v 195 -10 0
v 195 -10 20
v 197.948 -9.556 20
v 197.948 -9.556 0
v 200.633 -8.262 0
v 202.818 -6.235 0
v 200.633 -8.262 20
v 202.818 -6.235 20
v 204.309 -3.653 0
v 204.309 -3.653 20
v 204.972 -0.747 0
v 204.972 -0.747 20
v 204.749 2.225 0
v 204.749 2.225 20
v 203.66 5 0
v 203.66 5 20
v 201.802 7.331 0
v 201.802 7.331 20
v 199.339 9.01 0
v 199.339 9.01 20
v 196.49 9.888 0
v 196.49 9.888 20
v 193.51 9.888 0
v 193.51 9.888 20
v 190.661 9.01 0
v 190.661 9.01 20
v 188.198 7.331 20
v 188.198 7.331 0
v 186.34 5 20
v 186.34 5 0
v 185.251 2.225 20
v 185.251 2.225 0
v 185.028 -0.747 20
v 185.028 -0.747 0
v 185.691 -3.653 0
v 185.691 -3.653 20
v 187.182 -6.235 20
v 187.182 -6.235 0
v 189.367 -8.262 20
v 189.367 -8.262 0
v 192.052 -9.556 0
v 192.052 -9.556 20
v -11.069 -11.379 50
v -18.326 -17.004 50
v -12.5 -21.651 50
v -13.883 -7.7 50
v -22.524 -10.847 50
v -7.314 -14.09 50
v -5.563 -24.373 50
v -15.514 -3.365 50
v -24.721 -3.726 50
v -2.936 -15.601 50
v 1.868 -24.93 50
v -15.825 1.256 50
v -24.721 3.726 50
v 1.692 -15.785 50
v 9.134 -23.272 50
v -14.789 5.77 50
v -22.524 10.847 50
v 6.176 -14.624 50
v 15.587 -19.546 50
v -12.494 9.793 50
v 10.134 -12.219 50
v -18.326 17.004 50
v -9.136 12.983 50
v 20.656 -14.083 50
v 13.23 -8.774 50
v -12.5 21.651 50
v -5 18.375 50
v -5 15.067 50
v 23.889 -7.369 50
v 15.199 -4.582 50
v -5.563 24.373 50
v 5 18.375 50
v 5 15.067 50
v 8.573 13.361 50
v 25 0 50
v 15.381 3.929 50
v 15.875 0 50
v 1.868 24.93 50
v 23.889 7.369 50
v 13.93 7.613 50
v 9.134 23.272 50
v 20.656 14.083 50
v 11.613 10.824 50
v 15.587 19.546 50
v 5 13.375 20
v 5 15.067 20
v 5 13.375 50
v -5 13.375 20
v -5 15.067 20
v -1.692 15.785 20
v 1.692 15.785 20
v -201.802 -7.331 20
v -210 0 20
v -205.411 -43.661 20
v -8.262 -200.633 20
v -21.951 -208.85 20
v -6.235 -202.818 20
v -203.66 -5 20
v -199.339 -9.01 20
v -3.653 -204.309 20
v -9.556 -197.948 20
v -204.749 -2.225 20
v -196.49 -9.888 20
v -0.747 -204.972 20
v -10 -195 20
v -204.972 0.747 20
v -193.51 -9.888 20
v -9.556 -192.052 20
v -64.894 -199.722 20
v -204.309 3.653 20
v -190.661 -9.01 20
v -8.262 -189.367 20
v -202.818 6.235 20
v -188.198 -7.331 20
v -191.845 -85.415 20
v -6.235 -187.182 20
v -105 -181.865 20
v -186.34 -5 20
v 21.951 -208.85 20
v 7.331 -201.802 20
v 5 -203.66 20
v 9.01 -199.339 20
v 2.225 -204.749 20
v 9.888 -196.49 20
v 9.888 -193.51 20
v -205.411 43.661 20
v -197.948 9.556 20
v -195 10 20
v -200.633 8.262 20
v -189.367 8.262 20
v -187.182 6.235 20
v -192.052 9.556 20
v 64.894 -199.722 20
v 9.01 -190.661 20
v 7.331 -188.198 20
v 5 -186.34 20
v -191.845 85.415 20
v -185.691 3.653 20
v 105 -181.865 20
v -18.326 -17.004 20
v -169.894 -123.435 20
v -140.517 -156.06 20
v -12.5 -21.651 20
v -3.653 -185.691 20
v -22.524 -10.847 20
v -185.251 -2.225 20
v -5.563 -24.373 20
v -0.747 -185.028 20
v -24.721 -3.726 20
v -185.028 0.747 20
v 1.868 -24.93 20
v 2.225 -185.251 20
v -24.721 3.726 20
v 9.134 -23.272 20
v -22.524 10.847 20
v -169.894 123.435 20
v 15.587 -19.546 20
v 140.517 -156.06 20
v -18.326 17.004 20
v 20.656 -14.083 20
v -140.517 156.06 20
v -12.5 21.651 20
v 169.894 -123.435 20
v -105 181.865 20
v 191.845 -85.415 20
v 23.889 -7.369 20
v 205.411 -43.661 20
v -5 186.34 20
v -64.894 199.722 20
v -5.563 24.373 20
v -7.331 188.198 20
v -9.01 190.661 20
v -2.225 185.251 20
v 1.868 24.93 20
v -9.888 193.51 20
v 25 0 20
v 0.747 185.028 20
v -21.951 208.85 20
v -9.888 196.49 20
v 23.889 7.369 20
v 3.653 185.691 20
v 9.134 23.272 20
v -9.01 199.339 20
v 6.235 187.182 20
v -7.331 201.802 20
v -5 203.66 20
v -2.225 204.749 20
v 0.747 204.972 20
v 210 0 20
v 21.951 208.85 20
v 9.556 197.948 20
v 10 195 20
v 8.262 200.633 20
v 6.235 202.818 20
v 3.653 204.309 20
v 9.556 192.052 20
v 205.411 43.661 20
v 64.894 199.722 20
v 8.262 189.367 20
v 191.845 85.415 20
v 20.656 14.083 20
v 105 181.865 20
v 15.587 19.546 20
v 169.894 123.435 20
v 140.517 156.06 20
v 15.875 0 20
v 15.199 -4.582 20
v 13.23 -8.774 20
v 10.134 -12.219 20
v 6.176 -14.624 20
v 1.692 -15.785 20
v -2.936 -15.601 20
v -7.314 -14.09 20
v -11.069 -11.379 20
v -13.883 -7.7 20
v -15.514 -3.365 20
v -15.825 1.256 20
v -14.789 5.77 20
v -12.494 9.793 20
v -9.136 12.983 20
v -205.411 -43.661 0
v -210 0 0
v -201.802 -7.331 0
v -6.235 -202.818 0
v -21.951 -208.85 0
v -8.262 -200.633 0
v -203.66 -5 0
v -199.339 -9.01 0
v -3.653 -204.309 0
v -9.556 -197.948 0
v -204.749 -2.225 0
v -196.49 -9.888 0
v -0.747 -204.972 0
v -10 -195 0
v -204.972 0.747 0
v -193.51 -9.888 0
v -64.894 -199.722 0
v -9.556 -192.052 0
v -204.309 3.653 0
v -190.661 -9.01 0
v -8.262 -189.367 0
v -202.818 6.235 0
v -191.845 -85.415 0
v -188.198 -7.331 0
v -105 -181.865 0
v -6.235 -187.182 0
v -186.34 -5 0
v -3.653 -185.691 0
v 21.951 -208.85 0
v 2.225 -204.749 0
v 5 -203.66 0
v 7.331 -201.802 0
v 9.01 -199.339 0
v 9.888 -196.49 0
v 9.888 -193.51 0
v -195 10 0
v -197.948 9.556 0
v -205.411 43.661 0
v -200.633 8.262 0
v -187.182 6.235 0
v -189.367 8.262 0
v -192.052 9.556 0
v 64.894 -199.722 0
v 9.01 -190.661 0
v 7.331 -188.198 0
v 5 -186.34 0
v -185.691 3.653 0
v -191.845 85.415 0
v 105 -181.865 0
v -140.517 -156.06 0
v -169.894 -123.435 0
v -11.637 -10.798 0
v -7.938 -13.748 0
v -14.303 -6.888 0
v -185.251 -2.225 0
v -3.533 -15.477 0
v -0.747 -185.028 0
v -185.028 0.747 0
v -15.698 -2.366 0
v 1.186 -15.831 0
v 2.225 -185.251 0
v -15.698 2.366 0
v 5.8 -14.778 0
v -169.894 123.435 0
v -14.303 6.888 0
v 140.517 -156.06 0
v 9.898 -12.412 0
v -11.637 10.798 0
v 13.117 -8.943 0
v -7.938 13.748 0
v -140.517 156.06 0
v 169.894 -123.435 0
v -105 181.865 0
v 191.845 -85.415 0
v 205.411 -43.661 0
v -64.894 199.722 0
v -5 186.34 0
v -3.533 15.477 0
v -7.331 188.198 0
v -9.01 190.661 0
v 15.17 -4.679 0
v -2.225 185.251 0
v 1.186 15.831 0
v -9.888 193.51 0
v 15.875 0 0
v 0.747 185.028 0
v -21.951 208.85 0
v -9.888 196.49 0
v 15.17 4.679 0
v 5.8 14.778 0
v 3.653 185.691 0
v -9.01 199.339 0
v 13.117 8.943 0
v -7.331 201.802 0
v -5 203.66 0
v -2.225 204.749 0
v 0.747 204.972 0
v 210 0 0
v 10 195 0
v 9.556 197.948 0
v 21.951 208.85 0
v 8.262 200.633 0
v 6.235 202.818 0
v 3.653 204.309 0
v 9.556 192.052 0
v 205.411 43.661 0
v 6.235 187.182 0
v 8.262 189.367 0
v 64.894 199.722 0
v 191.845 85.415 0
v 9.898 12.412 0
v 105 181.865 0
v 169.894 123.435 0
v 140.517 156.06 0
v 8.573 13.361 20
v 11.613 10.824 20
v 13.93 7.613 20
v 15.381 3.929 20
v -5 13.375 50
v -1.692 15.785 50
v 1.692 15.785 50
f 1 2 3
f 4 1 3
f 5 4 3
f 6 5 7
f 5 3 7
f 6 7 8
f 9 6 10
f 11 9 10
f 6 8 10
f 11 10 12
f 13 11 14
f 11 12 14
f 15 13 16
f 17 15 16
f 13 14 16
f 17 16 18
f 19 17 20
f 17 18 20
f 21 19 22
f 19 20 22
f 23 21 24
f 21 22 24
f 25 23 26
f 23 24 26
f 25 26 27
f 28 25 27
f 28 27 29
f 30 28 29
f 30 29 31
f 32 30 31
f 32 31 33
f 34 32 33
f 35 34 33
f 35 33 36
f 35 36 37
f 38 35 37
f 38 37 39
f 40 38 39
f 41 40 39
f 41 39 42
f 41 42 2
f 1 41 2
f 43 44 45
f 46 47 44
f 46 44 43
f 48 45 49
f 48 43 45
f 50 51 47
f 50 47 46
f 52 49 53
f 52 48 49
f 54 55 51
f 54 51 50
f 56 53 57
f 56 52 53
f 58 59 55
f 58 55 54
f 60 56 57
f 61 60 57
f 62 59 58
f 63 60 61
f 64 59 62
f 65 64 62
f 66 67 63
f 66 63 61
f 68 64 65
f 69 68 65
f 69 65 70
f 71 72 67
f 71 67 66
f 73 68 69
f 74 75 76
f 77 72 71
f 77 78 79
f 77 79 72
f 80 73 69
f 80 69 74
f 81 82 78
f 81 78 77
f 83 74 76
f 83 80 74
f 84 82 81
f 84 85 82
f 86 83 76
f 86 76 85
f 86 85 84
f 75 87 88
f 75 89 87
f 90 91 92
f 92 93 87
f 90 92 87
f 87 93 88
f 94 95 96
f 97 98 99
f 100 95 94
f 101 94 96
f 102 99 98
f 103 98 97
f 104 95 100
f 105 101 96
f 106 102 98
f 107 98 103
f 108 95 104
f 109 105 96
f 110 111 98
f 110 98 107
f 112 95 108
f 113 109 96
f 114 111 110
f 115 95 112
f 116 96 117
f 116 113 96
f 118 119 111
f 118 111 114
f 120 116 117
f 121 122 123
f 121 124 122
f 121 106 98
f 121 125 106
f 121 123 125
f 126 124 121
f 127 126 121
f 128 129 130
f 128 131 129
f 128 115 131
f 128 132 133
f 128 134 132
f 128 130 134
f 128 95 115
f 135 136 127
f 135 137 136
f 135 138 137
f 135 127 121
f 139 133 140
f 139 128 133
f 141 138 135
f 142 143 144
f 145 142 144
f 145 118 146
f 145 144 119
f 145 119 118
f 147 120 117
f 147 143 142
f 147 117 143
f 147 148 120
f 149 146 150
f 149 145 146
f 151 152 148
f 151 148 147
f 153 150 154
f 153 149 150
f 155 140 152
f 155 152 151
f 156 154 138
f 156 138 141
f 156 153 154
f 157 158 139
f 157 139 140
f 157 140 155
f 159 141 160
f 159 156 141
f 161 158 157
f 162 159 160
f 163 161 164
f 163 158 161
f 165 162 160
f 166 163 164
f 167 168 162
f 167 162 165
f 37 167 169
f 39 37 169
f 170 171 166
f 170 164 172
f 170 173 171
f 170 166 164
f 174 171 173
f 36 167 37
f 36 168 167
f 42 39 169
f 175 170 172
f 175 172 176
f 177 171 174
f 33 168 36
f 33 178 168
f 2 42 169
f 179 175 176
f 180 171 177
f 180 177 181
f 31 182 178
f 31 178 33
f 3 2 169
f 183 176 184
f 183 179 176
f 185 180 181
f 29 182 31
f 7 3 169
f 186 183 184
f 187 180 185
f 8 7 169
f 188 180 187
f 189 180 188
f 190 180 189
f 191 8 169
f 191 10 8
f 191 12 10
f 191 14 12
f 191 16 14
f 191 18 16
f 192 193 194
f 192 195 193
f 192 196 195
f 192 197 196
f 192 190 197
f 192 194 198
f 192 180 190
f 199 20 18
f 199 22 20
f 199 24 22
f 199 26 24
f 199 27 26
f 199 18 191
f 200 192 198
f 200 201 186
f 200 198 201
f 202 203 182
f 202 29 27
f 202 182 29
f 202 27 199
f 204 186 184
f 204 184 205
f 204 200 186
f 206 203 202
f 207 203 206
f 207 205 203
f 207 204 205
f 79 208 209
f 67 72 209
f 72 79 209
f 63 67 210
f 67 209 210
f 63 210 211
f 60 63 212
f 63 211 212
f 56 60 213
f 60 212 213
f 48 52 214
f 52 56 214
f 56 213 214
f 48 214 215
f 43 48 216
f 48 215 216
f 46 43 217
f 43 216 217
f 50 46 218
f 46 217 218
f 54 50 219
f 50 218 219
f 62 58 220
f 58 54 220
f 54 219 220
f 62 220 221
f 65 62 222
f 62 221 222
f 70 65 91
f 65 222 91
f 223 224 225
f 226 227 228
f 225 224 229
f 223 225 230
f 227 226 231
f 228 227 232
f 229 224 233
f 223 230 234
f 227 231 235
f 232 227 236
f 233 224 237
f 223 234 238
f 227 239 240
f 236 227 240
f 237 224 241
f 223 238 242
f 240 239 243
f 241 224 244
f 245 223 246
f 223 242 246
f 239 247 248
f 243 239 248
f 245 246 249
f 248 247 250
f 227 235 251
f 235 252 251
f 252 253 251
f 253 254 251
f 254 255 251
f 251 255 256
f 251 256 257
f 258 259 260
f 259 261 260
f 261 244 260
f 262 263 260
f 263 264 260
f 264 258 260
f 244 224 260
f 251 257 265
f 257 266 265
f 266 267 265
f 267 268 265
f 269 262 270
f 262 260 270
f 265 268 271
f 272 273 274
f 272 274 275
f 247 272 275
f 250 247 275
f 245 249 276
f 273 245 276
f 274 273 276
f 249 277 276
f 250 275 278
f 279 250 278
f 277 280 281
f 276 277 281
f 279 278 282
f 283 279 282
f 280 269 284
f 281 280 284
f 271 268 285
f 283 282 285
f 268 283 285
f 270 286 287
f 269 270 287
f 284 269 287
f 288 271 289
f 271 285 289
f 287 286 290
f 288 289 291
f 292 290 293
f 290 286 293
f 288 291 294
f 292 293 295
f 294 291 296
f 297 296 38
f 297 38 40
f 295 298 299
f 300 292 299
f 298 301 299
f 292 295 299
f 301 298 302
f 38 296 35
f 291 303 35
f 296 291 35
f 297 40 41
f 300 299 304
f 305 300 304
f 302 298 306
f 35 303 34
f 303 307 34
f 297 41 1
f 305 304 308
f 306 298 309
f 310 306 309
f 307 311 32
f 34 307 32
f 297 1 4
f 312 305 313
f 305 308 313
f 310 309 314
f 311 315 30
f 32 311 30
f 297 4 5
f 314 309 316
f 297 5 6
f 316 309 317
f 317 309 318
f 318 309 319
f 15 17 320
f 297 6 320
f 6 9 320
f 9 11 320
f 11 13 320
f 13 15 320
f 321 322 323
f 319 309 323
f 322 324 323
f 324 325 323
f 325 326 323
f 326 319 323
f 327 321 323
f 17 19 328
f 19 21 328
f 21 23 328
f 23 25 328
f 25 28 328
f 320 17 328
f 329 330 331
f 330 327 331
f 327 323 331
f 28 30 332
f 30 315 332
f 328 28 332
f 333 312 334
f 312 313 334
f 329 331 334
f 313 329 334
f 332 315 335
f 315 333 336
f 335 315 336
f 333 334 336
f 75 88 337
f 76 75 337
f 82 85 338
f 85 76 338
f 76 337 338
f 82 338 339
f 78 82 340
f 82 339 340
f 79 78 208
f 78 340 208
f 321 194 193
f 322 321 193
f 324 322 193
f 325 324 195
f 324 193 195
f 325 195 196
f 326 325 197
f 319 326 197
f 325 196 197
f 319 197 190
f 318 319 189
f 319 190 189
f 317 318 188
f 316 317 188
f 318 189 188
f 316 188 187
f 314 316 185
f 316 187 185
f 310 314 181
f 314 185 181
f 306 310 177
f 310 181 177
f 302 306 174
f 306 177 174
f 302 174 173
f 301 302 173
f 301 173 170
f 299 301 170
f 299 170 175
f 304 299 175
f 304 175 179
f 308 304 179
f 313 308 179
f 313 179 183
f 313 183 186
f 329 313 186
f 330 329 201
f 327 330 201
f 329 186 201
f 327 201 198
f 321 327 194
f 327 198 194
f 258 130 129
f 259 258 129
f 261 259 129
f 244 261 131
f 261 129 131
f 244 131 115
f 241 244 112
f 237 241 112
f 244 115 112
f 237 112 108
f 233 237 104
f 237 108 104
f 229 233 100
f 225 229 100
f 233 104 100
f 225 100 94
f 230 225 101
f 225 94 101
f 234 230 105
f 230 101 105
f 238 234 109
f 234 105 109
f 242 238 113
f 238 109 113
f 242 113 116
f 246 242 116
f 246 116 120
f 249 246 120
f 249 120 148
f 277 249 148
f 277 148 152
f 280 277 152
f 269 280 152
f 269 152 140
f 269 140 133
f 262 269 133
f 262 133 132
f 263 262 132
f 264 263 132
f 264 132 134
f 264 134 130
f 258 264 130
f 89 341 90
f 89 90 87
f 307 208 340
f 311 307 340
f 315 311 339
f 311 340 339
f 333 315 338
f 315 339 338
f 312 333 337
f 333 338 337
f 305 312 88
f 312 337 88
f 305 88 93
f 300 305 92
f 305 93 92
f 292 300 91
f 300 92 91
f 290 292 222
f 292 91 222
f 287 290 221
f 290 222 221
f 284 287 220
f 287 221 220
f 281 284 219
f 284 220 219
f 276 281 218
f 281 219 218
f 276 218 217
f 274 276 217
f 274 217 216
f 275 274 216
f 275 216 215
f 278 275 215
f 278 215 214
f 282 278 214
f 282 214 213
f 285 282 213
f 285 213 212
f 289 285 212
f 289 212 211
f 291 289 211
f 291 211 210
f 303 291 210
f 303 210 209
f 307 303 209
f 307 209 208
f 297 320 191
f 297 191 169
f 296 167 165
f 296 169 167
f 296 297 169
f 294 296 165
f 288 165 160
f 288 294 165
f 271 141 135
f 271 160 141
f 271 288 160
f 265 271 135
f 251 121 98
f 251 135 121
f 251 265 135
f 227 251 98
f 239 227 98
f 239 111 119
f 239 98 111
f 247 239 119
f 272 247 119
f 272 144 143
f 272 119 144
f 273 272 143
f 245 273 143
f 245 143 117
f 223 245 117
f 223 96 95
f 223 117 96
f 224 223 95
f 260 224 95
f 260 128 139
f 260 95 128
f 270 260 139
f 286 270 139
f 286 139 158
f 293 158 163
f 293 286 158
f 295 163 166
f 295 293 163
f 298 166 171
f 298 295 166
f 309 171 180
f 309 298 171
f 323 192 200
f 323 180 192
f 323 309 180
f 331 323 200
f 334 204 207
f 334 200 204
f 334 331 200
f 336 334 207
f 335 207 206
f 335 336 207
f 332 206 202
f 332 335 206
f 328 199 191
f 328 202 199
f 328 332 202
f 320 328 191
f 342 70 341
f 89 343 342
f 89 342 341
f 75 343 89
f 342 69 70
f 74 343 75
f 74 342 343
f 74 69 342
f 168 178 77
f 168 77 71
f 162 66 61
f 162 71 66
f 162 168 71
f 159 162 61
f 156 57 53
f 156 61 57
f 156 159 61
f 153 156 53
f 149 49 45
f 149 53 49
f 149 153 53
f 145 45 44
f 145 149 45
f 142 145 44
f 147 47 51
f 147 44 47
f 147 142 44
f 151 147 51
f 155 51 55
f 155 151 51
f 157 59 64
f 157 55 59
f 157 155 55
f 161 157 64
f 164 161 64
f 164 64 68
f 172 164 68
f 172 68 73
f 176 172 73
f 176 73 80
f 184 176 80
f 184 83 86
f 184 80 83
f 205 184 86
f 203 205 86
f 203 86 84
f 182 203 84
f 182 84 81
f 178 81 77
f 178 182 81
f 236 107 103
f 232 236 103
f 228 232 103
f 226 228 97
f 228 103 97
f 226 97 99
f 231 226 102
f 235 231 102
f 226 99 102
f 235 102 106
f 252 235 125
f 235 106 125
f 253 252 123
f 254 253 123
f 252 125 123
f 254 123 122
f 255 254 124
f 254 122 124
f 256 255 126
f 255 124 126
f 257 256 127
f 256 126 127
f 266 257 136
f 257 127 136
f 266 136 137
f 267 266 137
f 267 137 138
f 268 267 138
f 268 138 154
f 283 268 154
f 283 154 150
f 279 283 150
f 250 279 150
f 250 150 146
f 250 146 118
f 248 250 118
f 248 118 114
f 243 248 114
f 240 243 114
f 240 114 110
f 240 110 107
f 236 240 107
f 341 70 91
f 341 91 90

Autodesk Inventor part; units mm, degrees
ref_plane "YZ Plane" through (0, 0, 0) normal (1, 0, 0) x (0, 1, 0)
ref_plane "XZ Plane" through (0, 0, 0) normal (0, 1, 0) x (-1, 0, 0)
ref_plane "XY Plane" through (0, 0, 0) normal (0, 0, 1) x (1, 0, 0)
sketch "Sketch1" plane through (0, 0, 0) normal (0, 0, 1) x (1, 0, 0)
  point P0 (0, 0)
sketch "Sketch2" plane through (0, 0, 0) normal (0, 0, 1) x (1, 0, 0)
  circle A0 centre (0, 0) radius 210
  dimension "d0" = 420
extrude "Extrusion1" add sketch "Sketch2" along normal blind 20
sketch "Sketch3" plane through (0, 0, 20) normal (0, 0, 1) x (1, 0, 0)
  circle A0 centre (0, 0) radius 25
  circle A1 centre (0, 0) radius 15.875
  dimension "d6" = 50
  dimension "d7" = 31.75
extrude "Extrusion2" add sketch "Sketch3" along normal blind 30
extrude "Extrusion3" cut sketch "Sketch3" against normal blind 20 contours A1
sketch "Sketch4" plane through (0, 0, 20) normal (0, 0, 1) x (1, 0, 0)
  circle A0 centre (0, 0) radius 15.875 projected
  circle A1 centre (0, 0) radius 180
  circle A2 centre (0, 195) radius 10
  dimension "d12" = 360
  dimension "d13" = 20
  dimension "d23" = 195
extrude "Extrusion4" cut sketch "Sketch4" against normal blind 20 contours A2
sketch "Sketch5" plane through (0, 0, 50) normal (0, 0, 1) x (1, 0, 0)
  line L0 (-5, 13.375) -> (5, 13.375)
  line L1 (5, 13.375) -> (5, 18.375)
  line L2 (5, 18.375) -> (-5, 18.375)
  line L3 (-5, 18.375) -> (-5, 13.375)
  circle A0 centre (0, 0) radius 15.875 projected
  line L4 (-5, 13.375) -> (5, 18.375) construction
  line L5 (5, 13.375) -> (-5, 18.375) construction
  point P0 (0, 15.875)
  point P1 (-5, 15.067)
  point P2 (5, 15.067)
  dimension "d19" = 10
  dimension "d20" = 5
extrude "Extrusion5" add sketch "Sketch5" against normal blind 30 contours L3 A0 L1 L0 | L3 L2 L1 A0 picked at (-0.5641, 14.1782)
pattern_circular "Circular Pattern1" count 4 over 360 about axis through (0, 0, 0) along (0, 0, 1) of "Extrusion4"
properties part number "Rotary Motor Coupling"
